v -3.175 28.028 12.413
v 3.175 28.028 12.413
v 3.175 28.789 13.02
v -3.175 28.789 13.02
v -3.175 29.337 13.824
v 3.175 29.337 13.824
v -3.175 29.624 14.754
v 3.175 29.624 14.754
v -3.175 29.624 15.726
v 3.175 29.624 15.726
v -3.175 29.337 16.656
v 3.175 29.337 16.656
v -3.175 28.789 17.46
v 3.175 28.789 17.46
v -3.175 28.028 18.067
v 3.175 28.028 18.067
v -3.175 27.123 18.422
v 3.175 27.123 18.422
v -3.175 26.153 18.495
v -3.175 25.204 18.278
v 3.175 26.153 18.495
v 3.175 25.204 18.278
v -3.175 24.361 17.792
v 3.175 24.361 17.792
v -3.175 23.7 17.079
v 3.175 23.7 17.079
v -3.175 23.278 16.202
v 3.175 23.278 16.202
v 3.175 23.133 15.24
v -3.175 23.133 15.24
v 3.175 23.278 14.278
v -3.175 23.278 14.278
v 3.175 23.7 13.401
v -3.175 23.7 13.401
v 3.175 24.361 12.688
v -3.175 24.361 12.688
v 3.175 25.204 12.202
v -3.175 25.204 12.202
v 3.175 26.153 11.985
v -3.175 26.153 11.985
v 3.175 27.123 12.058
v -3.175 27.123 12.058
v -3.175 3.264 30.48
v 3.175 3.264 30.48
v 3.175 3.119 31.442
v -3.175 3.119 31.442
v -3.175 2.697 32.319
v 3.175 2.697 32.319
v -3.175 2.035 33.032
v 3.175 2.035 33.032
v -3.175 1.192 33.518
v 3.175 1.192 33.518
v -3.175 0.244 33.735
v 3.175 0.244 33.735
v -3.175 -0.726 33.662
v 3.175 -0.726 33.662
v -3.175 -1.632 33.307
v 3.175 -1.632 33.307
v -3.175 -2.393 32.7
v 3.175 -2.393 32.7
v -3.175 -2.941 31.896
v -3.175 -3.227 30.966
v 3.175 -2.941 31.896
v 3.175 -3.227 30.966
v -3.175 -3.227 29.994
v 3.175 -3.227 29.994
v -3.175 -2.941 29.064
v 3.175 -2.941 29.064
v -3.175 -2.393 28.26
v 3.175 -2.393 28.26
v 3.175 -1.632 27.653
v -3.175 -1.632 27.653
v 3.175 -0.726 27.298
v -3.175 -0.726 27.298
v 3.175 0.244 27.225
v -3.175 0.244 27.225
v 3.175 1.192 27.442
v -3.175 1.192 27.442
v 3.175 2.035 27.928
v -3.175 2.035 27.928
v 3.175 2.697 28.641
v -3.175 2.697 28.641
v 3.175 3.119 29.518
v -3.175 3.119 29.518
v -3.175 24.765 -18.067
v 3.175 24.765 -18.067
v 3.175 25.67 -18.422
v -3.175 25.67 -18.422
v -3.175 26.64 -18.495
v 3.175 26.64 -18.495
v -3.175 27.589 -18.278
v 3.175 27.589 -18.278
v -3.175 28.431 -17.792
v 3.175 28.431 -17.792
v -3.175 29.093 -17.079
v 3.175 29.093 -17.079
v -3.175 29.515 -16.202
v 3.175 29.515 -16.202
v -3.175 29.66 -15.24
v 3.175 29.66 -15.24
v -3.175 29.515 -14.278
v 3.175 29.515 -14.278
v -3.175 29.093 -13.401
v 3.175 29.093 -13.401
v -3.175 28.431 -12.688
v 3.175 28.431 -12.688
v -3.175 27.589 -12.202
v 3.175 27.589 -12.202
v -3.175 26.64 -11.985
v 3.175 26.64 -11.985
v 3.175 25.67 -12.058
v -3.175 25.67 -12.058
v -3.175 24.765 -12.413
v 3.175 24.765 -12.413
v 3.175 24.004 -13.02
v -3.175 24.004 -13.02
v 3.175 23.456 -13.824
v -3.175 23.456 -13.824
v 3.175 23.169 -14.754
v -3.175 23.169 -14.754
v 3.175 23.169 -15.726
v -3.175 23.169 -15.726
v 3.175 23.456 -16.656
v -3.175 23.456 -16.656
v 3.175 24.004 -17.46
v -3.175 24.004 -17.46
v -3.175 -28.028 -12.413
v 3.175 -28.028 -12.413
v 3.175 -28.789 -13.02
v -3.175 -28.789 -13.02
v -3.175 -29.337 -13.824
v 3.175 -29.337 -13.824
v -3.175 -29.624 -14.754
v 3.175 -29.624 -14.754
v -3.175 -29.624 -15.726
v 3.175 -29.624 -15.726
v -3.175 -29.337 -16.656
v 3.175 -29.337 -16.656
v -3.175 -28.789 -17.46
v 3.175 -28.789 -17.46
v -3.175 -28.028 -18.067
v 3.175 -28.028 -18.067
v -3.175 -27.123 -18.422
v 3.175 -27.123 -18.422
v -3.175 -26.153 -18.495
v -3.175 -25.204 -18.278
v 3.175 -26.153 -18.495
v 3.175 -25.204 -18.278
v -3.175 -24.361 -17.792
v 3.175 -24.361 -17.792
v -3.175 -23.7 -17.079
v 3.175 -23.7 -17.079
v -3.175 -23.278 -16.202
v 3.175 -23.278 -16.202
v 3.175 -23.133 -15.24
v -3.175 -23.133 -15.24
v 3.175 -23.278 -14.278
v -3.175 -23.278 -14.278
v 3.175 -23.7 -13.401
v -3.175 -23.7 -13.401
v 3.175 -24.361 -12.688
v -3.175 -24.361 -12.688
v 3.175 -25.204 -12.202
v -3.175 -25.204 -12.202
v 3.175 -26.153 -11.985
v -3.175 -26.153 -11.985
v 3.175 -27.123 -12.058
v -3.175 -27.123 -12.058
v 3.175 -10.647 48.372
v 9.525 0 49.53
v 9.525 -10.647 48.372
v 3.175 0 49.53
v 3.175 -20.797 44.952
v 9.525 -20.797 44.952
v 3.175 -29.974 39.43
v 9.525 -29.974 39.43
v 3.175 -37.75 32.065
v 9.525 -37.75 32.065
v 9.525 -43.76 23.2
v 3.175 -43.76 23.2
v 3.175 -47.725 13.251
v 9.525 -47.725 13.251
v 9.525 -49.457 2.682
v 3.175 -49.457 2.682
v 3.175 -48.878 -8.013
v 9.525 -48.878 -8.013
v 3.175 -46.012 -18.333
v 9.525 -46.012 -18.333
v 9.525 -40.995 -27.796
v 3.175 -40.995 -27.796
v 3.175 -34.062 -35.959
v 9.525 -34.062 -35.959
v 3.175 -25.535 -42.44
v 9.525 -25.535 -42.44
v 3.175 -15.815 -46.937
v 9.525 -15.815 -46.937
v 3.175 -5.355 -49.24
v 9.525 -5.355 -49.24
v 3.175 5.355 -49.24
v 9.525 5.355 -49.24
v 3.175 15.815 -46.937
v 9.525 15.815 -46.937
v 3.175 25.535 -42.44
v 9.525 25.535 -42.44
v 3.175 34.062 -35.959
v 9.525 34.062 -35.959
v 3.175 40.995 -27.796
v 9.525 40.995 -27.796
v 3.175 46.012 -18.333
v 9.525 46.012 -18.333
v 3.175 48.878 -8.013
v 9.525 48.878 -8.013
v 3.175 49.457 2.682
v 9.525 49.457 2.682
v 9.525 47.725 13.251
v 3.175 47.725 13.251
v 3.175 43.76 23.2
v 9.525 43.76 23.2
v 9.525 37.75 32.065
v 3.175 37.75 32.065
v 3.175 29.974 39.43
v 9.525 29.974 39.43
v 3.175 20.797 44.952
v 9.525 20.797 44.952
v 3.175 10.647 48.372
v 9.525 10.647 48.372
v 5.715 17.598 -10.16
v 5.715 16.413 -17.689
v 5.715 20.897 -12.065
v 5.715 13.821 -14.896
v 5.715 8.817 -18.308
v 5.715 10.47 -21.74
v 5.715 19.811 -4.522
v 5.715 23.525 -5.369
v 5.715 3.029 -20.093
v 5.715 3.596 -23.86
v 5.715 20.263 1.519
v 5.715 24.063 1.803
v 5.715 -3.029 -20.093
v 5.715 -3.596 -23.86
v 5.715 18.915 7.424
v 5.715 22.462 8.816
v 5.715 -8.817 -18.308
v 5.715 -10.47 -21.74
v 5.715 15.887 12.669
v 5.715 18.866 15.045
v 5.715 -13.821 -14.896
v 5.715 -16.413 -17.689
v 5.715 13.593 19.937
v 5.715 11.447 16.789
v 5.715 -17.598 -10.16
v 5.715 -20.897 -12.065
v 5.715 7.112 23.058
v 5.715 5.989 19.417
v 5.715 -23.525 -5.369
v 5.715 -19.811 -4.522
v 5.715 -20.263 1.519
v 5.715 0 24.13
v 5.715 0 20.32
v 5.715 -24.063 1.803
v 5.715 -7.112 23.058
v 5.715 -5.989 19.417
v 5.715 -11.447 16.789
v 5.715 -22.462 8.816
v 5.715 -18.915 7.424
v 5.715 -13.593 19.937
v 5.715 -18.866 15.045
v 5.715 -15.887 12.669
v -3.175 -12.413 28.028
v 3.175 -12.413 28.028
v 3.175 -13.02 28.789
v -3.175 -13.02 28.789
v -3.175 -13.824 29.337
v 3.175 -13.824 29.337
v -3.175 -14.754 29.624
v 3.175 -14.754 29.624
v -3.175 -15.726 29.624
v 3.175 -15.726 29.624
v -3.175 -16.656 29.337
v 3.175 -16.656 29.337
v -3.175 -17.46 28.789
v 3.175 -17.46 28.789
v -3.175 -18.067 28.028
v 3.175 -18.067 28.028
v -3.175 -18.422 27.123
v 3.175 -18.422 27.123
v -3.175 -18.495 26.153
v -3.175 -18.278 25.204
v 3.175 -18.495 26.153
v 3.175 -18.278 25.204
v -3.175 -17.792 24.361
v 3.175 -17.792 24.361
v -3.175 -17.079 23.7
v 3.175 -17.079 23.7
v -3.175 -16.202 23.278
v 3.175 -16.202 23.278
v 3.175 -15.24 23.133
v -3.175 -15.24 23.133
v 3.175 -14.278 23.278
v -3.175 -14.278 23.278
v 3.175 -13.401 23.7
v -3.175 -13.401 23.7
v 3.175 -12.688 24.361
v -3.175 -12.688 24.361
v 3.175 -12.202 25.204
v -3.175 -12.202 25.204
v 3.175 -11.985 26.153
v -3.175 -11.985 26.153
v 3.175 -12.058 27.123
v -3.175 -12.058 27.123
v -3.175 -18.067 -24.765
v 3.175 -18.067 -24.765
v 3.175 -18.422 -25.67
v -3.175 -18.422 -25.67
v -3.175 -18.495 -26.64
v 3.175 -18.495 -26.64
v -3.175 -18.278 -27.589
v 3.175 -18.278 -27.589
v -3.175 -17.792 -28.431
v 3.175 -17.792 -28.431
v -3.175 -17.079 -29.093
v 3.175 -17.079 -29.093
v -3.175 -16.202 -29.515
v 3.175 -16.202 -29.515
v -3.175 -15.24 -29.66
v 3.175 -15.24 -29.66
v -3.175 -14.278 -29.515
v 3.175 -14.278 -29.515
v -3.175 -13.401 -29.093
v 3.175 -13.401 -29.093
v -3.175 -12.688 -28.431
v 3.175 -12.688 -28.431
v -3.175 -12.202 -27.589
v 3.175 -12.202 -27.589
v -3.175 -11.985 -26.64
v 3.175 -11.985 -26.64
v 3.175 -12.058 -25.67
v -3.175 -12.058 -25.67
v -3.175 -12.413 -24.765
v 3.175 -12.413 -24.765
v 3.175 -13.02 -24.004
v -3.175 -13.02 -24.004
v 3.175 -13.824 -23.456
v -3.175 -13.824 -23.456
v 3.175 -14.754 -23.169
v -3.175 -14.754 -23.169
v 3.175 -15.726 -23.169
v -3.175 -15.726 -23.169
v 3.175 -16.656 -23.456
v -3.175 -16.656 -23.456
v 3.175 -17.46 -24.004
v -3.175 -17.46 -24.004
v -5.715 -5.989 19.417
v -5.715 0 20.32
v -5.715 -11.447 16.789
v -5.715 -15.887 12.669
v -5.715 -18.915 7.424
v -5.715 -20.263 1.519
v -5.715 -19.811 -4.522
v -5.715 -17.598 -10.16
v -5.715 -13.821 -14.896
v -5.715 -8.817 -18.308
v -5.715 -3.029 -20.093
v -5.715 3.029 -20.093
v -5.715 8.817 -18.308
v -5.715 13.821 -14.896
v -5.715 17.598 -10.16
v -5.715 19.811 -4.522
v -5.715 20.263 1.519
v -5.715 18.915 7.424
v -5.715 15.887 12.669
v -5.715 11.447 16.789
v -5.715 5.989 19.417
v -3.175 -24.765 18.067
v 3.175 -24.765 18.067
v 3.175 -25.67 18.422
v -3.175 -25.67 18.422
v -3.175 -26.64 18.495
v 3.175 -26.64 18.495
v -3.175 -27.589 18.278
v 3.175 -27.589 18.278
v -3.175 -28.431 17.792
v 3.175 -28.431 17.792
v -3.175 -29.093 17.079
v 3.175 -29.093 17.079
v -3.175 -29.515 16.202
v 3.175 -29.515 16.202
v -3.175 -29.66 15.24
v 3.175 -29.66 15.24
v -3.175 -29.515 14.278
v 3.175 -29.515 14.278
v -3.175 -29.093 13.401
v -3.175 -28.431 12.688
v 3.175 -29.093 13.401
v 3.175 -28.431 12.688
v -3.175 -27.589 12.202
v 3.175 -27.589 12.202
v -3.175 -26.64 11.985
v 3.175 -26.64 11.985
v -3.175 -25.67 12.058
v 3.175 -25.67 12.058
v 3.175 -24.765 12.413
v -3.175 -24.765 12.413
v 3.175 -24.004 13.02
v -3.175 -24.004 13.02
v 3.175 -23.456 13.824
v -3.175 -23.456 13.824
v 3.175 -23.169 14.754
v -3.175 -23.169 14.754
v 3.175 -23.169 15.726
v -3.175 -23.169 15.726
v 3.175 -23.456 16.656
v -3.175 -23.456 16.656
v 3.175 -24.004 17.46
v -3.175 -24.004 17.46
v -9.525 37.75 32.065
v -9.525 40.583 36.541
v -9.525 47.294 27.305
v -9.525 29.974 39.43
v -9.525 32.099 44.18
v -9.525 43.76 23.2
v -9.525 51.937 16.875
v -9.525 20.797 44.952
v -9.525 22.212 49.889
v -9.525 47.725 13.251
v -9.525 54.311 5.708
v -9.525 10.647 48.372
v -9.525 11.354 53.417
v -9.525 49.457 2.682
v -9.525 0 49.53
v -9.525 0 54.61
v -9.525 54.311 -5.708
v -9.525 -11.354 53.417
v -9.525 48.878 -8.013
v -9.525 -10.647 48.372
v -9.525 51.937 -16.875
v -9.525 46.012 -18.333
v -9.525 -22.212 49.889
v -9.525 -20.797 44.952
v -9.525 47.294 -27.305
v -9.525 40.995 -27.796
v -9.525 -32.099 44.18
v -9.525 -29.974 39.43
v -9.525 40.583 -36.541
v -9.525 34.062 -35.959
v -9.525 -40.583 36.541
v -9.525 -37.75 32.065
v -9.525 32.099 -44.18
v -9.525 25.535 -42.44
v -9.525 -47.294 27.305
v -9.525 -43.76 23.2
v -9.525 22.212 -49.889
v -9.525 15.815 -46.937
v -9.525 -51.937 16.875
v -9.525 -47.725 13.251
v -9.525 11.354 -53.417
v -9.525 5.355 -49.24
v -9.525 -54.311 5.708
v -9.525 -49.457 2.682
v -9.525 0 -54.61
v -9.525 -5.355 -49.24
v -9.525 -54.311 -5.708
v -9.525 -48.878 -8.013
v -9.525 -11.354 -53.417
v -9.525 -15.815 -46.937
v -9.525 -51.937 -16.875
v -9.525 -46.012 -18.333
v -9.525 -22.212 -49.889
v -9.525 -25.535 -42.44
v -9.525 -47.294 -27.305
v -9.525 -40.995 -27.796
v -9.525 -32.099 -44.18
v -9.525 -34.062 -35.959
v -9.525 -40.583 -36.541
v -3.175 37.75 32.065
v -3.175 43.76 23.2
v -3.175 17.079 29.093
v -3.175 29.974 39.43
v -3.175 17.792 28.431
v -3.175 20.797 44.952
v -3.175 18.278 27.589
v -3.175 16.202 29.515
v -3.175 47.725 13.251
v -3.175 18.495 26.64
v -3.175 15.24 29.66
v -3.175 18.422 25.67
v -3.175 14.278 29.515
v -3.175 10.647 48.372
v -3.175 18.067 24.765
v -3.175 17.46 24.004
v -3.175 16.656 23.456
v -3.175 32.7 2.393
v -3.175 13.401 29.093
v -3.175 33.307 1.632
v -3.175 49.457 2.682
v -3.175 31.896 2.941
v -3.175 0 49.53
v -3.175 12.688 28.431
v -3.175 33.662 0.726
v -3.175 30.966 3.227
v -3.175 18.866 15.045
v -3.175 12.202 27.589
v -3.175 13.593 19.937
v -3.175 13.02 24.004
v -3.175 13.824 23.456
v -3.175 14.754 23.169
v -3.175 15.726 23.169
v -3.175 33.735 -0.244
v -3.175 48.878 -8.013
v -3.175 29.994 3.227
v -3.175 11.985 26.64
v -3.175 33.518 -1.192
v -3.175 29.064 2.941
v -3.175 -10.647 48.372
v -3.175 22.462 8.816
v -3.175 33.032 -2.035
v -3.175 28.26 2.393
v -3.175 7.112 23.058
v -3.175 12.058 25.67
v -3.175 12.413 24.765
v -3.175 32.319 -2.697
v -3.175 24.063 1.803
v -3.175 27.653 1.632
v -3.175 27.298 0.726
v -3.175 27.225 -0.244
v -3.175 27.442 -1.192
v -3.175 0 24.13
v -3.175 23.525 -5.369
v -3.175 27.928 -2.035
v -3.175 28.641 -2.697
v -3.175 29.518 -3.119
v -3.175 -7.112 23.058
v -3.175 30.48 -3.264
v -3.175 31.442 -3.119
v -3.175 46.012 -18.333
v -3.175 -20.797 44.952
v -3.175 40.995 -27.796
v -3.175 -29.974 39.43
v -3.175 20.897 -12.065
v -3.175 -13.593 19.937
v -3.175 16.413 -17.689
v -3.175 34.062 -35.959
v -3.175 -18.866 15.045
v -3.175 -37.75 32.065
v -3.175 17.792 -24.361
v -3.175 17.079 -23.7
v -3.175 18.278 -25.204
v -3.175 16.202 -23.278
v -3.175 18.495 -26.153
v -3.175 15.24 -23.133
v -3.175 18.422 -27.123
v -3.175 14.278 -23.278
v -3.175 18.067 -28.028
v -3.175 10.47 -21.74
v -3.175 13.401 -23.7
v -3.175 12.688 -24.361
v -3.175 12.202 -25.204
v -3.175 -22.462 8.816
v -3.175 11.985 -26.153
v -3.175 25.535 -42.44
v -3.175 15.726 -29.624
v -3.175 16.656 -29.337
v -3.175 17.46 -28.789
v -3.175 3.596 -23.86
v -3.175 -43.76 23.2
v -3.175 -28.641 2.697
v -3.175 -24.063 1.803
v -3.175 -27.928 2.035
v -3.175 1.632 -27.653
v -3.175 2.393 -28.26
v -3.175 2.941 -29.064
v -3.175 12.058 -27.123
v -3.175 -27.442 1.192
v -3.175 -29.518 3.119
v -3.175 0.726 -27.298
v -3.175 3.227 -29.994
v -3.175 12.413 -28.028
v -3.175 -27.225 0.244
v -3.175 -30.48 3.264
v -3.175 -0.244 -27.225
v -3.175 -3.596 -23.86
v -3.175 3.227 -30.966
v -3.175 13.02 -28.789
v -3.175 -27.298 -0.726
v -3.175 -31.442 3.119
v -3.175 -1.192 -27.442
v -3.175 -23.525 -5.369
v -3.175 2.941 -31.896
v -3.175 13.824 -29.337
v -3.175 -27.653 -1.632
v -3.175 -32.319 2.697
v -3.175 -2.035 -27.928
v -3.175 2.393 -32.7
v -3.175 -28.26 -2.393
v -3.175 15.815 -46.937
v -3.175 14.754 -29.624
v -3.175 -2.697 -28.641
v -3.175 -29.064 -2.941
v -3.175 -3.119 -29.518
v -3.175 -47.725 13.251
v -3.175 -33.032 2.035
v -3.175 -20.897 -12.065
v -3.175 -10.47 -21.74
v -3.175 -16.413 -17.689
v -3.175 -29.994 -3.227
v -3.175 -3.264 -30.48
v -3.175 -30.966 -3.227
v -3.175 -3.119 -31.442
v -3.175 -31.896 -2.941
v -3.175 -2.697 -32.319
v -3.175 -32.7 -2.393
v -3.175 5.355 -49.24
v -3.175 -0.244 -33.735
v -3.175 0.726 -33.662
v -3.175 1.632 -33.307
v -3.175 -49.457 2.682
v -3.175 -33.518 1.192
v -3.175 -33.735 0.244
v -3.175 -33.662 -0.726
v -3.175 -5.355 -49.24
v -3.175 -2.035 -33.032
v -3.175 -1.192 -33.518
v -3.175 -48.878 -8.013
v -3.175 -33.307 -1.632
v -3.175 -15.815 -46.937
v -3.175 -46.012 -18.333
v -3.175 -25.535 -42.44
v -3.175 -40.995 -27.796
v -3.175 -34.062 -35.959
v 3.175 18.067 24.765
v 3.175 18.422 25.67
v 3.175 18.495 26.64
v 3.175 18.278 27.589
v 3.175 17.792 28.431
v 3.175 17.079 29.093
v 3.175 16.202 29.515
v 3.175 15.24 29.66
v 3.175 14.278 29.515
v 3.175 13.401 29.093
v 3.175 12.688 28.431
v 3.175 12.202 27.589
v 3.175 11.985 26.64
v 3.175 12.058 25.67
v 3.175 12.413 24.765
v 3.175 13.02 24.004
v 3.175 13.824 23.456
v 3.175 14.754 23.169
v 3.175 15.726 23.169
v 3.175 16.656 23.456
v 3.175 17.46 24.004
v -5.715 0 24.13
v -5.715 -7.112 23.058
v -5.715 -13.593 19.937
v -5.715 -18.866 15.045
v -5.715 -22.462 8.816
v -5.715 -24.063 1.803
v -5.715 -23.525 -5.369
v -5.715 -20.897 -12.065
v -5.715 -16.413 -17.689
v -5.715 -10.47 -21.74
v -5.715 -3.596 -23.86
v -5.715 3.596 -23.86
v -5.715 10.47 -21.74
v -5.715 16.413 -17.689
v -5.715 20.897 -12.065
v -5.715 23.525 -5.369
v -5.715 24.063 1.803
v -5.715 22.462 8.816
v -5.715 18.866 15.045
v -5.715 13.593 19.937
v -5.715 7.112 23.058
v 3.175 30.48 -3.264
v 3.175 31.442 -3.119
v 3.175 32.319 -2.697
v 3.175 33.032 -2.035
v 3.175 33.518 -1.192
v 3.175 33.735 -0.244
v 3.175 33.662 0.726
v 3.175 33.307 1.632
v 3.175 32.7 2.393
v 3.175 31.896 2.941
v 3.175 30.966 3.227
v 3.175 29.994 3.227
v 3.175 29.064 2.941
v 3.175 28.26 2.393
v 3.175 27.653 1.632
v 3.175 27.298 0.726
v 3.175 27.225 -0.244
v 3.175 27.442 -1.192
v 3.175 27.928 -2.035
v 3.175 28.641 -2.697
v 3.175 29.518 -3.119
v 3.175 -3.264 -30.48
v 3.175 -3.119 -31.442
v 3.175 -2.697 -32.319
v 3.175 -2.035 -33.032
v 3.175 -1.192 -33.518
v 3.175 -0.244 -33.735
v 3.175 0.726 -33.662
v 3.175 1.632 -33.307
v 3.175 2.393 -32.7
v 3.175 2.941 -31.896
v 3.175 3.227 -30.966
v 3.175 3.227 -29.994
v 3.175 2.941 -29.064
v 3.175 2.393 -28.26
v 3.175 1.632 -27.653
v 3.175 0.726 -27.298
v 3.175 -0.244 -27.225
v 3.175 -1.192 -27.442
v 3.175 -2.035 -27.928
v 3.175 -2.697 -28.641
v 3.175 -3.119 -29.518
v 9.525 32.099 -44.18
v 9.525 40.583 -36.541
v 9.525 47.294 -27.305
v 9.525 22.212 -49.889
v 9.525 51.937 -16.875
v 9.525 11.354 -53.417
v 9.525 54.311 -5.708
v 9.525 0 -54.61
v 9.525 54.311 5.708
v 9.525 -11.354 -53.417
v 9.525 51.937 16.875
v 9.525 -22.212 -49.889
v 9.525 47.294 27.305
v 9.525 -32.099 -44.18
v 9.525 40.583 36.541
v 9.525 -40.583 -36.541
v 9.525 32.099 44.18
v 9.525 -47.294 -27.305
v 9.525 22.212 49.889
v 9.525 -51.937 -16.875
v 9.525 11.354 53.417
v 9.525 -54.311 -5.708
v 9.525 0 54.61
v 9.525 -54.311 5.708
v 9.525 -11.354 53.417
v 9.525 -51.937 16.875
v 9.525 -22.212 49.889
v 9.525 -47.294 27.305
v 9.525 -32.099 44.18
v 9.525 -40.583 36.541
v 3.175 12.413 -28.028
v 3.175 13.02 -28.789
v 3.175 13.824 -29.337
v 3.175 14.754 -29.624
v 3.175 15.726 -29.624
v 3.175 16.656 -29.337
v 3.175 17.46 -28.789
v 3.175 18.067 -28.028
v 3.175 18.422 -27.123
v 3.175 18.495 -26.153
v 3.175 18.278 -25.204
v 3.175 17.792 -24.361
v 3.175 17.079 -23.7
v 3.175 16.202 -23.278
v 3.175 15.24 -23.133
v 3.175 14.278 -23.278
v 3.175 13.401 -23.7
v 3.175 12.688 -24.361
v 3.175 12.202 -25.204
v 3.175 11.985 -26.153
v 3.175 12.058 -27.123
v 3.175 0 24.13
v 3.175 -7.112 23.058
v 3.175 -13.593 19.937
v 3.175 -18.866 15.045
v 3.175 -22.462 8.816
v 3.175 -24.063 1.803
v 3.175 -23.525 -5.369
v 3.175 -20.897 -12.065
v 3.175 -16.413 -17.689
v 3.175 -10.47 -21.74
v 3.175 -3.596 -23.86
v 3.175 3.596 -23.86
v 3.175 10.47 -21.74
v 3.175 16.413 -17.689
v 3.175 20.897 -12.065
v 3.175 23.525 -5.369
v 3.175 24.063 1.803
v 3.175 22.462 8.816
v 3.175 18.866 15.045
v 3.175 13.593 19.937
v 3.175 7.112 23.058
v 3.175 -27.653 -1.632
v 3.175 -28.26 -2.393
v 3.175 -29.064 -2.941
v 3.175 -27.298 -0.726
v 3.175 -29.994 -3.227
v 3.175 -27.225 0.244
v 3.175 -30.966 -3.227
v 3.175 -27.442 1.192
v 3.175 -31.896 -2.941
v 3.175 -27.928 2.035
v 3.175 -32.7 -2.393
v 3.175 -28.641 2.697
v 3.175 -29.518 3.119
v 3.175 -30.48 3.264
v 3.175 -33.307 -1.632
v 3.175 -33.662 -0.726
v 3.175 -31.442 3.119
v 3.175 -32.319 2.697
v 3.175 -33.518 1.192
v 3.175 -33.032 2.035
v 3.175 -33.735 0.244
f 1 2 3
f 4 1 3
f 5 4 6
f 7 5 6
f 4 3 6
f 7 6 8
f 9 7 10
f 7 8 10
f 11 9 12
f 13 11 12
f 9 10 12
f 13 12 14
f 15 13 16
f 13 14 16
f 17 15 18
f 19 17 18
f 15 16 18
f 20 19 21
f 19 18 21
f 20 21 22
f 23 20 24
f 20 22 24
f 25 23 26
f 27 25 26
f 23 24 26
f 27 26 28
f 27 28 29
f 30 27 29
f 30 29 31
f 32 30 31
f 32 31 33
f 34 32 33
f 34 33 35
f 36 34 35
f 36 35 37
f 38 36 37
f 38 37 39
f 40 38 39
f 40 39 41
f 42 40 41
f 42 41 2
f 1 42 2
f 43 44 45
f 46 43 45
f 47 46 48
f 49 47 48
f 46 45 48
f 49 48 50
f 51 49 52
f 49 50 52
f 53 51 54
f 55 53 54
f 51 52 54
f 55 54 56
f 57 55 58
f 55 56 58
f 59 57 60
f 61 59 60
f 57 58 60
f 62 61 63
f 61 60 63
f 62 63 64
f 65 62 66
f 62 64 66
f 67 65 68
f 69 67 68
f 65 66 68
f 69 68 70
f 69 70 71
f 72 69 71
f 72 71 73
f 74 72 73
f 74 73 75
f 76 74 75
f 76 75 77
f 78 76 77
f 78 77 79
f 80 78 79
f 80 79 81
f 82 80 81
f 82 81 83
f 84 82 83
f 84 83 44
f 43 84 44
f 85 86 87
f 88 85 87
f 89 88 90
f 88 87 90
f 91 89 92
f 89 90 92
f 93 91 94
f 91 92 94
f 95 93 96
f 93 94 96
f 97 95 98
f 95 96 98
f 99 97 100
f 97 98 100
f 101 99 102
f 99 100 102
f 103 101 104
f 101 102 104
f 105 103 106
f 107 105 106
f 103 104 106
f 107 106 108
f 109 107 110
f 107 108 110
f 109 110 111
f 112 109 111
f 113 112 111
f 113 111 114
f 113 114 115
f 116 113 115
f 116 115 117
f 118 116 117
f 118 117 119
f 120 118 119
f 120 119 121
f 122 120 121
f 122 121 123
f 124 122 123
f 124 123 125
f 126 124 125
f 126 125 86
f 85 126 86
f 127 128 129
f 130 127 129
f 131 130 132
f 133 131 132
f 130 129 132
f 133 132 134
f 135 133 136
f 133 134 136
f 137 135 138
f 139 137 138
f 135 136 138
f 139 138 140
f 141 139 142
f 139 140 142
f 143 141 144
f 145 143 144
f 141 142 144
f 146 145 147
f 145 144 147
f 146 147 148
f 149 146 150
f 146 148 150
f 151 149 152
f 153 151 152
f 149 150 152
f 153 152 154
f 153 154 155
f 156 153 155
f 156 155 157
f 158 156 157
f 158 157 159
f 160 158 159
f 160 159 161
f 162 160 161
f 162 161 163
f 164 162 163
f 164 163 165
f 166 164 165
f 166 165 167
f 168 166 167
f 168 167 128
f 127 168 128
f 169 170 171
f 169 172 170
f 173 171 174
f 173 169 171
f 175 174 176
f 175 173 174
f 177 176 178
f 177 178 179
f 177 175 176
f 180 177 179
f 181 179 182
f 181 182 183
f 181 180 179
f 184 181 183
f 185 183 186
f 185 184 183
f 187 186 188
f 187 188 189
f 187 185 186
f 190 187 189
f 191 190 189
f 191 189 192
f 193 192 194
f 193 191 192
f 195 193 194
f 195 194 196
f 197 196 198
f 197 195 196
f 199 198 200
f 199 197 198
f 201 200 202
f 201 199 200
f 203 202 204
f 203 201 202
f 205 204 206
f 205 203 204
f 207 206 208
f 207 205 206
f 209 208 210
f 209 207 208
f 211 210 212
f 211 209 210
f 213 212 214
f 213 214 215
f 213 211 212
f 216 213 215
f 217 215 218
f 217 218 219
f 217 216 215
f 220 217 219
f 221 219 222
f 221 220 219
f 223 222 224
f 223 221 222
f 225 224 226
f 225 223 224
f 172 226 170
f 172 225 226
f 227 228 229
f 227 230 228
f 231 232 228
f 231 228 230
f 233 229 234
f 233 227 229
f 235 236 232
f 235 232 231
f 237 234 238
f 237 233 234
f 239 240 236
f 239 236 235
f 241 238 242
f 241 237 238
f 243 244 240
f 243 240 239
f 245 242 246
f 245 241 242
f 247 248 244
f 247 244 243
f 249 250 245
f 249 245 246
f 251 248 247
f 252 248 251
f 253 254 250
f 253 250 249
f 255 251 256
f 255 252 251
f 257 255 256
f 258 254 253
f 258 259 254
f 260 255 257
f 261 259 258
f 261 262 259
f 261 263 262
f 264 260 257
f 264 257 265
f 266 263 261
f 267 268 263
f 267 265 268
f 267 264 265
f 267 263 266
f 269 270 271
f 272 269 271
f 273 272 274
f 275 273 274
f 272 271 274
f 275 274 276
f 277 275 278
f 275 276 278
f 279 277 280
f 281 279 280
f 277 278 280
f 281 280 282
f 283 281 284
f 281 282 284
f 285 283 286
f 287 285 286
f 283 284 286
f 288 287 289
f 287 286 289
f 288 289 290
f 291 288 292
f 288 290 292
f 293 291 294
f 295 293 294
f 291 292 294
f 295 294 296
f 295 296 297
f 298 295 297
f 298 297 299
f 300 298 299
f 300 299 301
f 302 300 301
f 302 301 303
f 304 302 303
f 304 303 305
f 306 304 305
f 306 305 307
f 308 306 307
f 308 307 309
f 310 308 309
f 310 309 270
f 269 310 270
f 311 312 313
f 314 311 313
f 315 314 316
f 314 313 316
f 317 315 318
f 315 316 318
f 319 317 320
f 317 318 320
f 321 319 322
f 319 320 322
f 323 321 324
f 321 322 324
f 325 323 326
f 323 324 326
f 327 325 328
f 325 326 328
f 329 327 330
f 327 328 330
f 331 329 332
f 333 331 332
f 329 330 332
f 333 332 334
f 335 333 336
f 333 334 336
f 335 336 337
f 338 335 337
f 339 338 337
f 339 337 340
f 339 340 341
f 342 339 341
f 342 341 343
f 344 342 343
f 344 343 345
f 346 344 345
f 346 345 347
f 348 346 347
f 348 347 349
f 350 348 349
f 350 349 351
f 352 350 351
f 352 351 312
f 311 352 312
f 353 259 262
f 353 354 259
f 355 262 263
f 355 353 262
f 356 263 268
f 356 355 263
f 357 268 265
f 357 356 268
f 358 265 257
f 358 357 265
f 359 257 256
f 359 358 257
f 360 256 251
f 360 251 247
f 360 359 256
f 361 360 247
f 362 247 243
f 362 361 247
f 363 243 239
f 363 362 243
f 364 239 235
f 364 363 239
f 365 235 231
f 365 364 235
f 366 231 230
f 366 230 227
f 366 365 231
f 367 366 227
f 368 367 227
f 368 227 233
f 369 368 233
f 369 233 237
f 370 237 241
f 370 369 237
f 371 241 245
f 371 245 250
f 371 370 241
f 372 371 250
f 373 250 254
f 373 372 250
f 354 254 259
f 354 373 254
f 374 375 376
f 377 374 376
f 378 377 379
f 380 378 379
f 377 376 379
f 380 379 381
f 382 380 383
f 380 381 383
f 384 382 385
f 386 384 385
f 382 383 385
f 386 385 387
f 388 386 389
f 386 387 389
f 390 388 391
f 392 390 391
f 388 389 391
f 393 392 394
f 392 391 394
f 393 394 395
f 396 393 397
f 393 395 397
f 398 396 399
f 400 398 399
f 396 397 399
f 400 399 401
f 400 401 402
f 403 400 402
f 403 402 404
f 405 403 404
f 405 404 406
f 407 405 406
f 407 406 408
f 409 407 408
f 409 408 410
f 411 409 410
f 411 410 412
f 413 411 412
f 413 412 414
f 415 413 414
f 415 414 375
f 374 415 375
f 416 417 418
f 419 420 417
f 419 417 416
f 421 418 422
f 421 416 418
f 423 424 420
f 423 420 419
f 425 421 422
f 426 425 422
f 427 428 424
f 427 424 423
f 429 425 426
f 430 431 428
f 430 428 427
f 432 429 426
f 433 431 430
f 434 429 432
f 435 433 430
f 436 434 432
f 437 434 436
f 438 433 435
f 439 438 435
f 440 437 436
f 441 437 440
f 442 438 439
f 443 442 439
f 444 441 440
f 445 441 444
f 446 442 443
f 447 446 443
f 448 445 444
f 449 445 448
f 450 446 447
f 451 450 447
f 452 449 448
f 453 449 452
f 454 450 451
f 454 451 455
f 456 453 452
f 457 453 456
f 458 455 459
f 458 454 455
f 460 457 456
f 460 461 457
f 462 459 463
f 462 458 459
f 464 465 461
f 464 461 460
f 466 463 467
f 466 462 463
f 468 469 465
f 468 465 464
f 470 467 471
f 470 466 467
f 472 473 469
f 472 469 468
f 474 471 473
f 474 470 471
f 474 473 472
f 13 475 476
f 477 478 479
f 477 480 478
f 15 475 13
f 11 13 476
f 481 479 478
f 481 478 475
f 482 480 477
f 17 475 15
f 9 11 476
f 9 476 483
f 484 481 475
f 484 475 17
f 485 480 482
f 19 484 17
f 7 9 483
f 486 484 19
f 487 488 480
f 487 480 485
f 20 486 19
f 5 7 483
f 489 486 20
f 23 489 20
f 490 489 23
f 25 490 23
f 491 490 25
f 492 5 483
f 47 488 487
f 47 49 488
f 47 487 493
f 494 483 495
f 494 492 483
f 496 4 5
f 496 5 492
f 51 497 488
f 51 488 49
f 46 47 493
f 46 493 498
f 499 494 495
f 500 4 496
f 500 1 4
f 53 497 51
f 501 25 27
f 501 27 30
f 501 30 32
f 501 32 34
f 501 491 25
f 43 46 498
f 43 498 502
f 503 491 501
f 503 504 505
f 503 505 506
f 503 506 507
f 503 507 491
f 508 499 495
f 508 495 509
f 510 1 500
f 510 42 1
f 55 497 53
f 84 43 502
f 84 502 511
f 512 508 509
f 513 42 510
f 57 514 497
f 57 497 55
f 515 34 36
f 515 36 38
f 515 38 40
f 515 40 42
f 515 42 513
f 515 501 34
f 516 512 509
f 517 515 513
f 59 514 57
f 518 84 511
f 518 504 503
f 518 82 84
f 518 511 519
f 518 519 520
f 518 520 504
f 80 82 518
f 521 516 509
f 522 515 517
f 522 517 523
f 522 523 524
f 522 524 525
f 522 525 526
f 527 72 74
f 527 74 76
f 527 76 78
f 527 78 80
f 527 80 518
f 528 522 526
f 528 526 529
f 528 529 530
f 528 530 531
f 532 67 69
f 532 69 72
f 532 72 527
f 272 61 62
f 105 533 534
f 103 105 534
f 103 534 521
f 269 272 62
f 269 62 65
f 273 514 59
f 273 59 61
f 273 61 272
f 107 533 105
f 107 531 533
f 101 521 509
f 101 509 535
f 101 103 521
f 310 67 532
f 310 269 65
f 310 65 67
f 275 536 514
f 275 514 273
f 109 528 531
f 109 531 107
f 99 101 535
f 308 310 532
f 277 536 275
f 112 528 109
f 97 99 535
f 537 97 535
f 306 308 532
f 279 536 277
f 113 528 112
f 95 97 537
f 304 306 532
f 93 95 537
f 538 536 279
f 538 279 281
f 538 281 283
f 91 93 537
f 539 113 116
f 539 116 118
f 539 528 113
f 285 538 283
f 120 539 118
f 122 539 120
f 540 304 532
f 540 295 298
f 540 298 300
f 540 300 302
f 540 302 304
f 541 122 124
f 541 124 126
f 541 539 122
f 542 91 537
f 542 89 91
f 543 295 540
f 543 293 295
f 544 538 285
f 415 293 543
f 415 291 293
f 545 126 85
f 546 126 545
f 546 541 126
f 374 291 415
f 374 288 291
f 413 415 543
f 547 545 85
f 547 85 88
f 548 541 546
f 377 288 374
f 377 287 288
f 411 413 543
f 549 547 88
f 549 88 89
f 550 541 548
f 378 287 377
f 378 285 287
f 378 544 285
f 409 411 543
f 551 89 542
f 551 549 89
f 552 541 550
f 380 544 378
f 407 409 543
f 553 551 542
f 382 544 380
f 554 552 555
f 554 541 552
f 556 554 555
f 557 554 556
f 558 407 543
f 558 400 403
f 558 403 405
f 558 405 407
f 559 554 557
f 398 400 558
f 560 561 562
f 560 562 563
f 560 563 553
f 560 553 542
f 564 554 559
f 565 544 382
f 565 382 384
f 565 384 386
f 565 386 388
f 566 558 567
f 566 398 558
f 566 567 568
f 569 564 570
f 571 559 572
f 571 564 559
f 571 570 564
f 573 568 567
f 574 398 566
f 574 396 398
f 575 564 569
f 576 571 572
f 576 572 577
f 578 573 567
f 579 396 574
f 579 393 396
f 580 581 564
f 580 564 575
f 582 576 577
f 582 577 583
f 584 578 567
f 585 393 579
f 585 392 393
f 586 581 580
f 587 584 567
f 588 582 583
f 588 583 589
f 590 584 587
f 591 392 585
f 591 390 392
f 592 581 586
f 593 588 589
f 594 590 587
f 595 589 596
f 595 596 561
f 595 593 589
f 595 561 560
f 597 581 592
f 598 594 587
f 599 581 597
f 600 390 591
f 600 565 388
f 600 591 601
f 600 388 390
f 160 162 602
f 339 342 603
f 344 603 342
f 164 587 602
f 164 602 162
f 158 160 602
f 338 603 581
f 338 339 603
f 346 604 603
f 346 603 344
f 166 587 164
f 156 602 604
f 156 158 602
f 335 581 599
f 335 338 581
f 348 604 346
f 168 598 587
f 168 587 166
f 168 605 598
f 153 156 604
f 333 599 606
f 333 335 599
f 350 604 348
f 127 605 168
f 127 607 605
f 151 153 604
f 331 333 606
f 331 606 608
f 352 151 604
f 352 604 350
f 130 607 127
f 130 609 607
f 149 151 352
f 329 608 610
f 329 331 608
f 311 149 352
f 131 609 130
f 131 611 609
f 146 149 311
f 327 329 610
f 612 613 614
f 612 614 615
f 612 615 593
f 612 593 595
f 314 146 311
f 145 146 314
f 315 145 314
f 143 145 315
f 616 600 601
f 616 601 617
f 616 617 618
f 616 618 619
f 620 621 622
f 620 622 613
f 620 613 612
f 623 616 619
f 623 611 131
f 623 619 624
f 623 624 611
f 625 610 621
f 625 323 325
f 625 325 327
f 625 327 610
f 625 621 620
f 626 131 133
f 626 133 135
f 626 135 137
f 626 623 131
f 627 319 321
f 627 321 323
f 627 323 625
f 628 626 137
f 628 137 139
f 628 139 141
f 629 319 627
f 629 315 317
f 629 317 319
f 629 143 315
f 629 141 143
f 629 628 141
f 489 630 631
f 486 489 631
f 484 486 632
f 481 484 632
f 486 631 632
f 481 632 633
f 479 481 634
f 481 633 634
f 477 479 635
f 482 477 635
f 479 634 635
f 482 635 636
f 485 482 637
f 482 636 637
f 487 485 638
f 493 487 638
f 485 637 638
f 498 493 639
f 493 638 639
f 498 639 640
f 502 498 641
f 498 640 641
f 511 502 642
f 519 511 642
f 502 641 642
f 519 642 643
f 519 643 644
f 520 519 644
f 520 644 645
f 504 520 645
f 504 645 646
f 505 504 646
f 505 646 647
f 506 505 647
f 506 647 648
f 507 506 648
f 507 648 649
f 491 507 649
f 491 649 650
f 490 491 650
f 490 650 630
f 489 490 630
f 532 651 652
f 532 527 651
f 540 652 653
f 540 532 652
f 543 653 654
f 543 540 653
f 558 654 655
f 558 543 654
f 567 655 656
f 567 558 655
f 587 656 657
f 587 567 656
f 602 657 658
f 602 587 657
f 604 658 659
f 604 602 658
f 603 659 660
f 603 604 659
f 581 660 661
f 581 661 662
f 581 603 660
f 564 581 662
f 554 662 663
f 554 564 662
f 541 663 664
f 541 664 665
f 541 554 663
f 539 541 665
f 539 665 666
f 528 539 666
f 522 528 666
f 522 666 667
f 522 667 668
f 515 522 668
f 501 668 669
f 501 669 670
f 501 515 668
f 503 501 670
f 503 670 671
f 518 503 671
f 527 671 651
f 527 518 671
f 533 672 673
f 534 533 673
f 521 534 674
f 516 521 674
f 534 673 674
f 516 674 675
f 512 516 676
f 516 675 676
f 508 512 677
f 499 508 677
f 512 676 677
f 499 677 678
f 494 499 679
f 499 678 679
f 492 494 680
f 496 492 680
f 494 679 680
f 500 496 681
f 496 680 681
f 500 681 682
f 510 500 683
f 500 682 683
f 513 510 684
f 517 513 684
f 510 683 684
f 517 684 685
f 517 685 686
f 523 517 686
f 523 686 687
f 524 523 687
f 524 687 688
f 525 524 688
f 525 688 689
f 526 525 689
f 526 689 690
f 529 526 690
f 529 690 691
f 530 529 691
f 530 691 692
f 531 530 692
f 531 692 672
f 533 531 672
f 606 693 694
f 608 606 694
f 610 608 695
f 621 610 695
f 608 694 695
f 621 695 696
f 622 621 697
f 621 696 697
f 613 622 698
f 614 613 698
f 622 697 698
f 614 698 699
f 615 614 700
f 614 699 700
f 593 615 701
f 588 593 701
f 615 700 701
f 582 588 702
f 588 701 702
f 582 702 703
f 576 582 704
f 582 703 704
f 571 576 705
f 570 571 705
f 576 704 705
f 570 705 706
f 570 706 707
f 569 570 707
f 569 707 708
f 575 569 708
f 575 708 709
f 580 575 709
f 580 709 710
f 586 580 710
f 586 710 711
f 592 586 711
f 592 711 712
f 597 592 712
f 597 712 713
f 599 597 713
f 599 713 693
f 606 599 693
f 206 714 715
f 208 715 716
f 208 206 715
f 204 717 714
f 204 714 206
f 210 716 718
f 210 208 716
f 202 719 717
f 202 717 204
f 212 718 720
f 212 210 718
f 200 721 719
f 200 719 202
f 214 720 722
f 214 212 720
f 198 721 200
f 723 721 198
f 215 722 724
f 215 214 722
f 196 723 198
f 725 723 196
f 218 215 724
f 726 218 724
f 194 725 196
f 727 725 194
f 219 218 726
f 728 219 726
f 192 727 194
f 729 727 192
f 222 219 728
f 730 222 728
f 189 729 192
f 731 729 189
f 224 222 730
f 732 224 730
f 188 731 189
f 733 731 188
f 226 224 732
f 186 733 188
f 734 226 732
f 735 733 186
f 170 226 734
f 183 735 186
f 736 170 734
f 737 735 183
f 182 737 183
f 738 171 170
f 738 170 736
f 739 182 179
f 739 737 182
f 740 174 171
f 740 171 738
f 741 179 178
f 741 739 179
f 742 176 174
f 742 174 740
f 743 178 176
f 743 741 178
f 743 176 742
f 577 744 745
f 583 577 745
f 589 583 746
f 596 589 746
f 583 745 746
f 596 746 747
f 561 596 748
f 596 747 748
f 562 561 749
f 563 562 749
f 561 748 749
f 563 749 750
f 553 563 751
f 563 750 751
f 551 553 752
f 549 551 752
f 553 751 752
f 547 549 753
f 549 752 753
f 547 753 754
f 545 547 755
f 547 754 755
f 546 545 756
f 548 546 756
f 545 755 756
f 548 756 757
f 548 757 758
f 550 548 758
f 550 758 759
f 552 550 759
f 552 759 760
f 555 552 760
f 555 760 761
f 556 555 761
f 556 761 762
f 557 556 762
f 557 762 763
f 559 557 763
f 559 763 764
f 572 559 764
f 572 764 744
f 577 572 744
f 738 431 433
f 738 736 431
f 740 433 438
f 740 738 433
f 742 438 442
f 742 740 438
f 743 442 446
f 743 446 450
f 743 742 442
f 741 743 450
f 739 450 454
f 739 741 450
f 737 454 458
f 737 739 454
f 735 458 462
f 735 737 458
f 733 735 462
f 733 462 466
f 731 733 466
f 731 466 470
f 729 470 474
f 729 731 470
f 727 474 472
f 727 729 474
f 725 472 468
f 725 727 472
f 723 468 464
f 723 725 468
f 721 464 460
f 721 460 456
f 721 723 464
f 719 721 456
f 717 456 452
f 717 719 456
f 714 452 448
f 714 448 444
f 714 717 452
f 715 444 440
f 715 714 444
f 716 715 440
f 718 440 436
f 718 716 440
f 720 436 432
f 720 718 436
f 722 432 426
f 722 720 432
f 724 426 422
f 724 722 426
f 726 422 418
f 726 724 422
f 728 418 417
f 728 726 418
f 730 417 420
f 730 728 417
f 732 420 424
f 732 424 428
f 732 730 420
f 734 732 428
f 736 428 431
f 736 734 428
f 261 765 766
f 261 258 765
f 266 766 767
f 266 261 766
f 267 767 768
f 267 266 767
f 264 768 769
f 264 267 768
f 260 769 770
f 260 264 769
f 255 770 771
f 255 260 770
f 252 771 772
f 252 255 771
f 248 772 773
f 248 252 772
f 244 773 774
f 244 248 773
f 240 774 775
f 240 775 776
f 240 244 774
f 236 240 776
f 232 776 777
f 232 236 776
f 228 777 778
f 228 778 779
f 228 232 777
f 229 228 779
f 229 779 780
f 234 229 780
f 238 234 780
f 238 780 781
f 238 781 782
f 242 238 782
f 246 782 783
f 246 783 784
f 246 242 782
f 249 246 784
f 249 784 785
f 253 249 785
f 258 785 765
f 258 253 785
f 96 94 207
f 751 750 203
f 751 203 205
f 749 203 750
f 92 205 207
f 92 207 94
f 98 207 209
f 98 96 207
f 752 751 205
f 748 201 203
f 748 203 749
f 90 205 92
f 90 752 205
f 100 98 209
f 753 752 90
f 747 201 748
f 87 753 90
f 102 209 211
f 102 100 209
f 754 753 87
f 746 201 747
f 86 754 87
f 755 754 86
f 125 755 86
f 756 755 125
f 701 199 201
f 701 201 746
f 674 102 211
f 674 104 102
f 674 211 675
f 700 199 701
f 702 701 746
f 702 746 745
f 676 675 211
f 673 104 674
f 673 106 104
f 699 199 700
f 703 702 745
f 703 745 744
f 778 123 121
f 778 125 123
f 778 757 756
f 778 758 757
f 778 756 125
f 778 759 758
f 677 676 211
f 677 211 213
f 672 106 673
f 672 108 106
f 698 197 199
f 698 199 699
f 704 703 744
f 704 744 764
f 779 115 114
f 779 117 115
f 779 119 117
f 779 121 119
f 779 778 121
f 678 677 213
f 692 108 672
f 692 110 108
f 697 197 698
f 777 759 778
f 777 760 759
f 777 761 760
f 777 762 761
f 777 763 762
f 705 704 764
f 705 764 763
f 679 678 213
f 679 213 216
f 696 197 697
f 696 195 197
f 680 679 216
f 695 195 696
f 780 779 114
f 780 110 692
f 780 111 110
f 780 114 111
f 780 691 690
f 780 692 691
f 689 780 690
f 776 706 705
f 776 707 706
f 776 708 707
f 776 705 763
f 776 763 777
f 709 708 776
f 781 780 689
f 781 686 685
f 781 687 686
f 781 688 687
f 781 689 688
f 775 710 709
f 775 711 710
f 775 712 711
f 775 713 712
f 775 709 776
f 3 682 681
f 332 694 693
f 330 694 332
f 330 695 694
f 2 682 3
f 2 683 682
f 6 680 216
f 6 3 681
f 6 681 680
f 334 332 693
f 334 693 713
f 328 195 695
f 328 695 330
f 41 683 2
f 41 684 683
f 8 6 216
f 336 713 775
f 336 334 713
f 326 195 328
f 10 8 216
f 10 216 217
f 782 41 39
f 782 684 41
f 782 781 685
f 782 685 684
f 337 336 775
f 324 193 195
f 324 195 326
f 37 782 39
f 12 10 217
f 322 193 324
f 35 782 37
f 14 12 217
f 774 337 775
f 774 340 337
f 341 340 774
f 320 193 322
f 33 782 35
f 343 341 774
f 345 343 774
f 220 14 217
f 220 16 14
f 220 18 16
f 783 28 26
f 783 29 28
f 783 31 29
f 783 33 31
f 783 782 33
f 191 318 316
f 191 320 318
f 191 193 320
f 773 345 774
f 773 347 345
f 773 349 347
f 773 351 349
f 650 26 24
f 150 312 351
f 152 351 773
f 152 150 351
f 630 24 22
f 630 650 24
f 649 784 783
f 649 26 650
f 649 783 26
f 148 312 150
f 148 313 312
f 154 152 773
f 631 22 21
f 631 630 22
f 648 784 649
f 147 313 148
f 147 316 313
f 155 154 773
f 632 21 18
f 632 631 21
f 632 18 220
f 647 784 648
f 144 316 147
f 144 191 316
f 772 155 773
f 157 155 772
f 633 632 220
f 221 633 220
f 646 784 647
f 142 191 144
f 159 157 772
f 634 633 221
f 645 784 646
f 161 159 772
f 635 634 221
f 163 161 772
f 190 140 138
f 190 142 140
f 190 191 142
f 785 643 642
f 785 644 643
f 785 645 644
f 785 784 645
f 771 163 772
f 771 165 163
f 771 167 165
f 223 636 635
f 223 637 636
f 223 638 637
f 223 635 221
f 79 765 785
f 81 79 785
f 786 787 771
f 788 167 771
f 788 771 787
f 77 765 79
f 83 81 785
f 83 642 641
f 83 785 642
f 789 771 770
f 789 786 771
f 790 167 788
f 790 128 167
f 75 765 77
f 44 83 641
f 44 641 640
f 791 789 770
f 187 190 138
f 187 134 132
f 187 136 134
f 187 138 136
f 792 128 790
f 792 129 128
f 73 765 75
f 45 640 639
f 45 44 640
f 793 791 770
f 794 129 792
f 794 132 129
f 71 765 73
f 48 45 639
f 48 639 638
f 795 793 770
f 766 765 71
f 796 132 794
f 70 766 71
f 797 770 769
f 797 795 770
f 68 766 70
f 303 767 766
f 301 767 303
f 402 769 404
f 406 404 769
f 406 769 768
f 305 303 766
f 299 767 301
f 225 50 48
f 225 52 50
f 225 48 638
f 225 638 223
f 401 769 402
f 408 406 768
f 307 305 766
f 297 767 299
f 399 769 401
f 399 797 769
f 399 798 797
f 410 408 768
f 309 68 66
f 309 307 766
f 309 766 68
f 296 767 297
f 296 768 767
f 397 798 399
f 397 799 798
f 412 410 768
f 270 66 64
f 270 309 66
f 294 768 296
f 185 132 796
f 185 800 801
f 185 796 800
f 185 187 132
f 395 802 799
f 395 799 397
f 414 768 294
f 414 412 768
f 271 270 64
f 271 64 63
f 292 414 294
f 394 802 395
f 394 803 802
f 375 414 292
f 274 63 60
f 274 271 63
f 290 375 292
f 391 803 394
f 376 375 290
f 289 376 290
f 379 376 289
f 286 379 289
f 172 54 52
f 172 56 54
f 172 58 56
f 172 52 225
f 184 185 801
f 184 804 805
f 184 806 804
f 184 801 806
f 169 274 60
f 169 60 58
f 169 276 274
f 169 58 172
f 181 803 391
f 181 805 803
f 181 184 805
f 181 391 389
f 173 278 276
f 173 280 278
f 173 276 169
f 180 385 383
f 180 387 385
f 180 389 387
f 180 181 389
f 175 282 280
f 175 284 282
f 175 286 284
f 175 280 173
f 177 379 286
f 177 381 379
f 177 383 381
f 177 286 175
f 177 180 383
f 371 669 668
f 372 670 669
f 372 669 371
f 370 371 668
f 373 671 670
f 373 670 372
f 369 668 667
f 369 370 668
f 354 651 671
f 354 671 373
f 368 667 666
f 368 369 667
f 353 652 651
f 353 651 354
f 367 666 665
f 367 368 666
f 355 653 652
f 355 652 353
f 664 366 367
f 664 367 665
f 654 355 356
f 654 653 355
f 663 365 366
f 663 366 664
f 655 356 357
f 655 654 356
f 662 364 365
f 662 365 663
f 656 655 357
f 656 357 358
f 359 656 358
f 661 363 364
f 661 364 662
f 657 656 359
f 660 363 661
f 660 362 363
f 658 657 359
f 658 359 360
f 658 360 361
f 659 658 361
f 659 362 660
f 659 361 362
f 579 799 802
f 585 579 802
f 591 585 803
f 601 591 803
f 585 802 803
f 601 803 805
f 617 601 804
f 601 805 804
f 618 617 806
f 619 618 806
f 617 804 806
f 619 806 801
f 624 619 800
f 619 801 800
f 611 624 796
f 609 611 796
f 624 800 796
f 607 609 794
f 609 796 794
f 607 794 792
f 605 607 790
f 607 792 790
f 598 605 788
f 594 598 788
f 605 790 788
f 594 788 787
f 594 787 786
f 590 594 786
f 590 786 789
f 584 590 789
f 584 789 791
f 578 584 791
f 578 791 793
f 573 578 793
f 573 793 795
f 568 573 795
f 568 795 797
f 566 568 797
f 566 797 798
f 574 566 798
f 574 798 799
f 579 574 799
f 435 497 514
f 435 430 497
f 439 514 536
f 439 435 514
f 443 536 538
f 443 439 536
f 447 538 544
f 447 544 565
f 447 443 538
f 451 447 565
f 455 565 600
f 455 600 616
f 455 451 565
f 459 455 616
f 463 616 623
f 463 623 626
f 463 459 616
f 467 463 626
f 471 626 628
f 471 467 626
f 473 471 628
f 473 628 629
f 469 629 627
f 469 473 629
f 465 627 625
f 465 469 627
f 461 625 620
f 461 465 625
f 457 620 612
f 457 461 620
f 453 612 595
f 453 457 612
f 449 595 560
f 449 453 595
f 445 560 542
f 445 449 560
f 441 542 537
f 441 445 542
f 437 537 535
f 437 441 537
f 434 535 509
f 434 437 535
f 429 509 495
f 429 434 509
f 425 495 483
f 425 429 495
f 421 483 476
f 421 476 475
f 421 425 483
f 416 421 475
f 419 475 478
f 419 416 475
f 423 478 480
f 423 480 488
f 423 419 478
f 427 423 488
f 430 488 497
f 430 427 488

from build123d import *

# Parameters (mm, degrees)
SKETCH2_R          = 3.2639
CUT_EXTRUDE1_DEPTH = 79.267453006
CIRPATTERN1_COUNT  = 12


with BuildPart() as part:
    # Sketch1 → Revolve1 (revolve)
    with BuildSketch(Plane.XY, mode=Mode.PRIVATE) as revolve1_sk:
        Polygon((-9.525, 54.61), (9.525, 54.61), (9.525, 49.53), (3.175, 49.53), (3.175, 24.13), (5.715, 24.13), (5.715, 20.32), (-5.715, 20.32), (-5.715, 24.13), (-3.175, 24.13), (-3.175, 49.53), (-9.525, 49.53), align=None)
    revolve(revolve1_sk.sketch.rotate(Axis((-31.293370787, 0, 0), (1, 0, 0)), 90), axis=Axis((-31.293370787, 0, 0), (1, 0, 0)))

    # Sketch2 → Cut-Extrude1 (cut, through all)
    with BuildSketch(Plane(origin=(3.175, 0, 0), x_dir=(0, 0, -1), z_dir=(1, 0, 0))):
        with Locations((0, 30.48)):
            Circle(SKETCH2_R)
    cut_extrude1 = extrude(amount=-CUT_EXTRUDE1_DEPTH, mode=Mode.SUBTRACT)

    # CirPattern1: Cut-Extrude1 ×12 about axis
    cirpattern1_axis = Axis((0, 0, 0), (1, 0, 0))
    for i in range(1, CIRPATTERN1_COUNT):
        add(cut_extrude1.rotate(cirpattern1_axis, i * 360 / CIRPATTERN1_COUNT), mode=Mode.SUBTRACT)


solid = part.part
